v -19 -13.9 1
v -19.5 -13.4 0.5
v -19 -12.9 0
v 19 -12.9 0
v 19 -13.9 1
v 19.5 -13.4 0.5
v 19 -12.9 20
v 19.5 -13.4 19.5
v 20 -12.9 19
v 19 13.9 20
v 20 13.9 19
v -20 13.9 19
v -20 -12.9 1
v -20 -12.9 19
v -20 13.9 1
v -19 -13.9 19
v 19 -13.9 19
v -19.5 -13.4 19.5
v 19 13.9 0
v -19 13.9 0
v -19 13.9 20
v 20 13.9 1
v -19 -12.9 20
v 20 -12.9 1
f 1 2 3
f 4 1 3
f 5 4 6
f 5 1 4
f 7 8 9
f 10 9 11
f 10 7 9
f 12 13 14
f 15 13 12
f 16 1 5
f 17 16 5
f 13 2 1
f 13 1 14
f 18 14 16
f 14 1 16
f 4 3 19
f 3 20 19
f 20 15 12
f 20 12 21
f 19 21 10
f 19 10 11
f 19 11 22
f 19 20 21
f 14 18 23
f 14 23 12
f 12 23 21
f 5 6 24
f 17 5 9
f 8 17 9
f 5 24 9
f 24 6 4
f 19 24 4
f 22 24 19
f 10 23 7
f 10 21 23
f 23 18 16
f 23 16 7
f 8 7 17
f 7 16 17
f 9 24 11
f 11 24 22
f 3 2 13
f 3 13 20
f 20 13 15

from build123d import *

# Parameters (mm, degrees)
SKETCH_1_W      = 40
SKETCH_1_H      = 27.8
EXTRUDE_1_DEPTH = 20
CHAMFER_1_SIZE  = 1
CHAMFER_2_SIZE  = 1
CHAMFER_3_SIZE  = 1


with BuildPart() as part:
    # 草图1 → 凸台-拉伸1 (new body)
    with BuildSketch(Plane.XY):
        Rectangle(SKETCH_1_W, SKETCH_1_H)
    extrude(amount=EXTRUDE_1_DEPTH)

    # 倒角1
    chamfer_1_edges = [part.edges().sort_by_distance(p)[0] for p in [
        (20, -13.9, 10),
        (-20, -13.9, 10),
    ]]
    chamfer(chamfer_1_edges, length=CHAMFER_1_SIZE)

    # 倒角2
    chamfer_2_edges = [part.edges().sort_by_distance(p)[0] for p in [
        (0, -13.9, 0),
        (0, -13.9, 20),
    ]]
    chamfer(chamfer_2_edges, length=CHAMFER_2_SIZE)

    # 倒角3
    chamfer_3_edges = [part.edges().sort_by_distance(p)[0] for p in [
        (-20, 0.5, 20),
        (20, 0.5, 0),
        (20, 0.5, 20),
        (-20, 0.5, 0),
    ]]
    chamfer(chamfer_3_edges, length=CHAMFER_3_SIZE)


solid = part.part
